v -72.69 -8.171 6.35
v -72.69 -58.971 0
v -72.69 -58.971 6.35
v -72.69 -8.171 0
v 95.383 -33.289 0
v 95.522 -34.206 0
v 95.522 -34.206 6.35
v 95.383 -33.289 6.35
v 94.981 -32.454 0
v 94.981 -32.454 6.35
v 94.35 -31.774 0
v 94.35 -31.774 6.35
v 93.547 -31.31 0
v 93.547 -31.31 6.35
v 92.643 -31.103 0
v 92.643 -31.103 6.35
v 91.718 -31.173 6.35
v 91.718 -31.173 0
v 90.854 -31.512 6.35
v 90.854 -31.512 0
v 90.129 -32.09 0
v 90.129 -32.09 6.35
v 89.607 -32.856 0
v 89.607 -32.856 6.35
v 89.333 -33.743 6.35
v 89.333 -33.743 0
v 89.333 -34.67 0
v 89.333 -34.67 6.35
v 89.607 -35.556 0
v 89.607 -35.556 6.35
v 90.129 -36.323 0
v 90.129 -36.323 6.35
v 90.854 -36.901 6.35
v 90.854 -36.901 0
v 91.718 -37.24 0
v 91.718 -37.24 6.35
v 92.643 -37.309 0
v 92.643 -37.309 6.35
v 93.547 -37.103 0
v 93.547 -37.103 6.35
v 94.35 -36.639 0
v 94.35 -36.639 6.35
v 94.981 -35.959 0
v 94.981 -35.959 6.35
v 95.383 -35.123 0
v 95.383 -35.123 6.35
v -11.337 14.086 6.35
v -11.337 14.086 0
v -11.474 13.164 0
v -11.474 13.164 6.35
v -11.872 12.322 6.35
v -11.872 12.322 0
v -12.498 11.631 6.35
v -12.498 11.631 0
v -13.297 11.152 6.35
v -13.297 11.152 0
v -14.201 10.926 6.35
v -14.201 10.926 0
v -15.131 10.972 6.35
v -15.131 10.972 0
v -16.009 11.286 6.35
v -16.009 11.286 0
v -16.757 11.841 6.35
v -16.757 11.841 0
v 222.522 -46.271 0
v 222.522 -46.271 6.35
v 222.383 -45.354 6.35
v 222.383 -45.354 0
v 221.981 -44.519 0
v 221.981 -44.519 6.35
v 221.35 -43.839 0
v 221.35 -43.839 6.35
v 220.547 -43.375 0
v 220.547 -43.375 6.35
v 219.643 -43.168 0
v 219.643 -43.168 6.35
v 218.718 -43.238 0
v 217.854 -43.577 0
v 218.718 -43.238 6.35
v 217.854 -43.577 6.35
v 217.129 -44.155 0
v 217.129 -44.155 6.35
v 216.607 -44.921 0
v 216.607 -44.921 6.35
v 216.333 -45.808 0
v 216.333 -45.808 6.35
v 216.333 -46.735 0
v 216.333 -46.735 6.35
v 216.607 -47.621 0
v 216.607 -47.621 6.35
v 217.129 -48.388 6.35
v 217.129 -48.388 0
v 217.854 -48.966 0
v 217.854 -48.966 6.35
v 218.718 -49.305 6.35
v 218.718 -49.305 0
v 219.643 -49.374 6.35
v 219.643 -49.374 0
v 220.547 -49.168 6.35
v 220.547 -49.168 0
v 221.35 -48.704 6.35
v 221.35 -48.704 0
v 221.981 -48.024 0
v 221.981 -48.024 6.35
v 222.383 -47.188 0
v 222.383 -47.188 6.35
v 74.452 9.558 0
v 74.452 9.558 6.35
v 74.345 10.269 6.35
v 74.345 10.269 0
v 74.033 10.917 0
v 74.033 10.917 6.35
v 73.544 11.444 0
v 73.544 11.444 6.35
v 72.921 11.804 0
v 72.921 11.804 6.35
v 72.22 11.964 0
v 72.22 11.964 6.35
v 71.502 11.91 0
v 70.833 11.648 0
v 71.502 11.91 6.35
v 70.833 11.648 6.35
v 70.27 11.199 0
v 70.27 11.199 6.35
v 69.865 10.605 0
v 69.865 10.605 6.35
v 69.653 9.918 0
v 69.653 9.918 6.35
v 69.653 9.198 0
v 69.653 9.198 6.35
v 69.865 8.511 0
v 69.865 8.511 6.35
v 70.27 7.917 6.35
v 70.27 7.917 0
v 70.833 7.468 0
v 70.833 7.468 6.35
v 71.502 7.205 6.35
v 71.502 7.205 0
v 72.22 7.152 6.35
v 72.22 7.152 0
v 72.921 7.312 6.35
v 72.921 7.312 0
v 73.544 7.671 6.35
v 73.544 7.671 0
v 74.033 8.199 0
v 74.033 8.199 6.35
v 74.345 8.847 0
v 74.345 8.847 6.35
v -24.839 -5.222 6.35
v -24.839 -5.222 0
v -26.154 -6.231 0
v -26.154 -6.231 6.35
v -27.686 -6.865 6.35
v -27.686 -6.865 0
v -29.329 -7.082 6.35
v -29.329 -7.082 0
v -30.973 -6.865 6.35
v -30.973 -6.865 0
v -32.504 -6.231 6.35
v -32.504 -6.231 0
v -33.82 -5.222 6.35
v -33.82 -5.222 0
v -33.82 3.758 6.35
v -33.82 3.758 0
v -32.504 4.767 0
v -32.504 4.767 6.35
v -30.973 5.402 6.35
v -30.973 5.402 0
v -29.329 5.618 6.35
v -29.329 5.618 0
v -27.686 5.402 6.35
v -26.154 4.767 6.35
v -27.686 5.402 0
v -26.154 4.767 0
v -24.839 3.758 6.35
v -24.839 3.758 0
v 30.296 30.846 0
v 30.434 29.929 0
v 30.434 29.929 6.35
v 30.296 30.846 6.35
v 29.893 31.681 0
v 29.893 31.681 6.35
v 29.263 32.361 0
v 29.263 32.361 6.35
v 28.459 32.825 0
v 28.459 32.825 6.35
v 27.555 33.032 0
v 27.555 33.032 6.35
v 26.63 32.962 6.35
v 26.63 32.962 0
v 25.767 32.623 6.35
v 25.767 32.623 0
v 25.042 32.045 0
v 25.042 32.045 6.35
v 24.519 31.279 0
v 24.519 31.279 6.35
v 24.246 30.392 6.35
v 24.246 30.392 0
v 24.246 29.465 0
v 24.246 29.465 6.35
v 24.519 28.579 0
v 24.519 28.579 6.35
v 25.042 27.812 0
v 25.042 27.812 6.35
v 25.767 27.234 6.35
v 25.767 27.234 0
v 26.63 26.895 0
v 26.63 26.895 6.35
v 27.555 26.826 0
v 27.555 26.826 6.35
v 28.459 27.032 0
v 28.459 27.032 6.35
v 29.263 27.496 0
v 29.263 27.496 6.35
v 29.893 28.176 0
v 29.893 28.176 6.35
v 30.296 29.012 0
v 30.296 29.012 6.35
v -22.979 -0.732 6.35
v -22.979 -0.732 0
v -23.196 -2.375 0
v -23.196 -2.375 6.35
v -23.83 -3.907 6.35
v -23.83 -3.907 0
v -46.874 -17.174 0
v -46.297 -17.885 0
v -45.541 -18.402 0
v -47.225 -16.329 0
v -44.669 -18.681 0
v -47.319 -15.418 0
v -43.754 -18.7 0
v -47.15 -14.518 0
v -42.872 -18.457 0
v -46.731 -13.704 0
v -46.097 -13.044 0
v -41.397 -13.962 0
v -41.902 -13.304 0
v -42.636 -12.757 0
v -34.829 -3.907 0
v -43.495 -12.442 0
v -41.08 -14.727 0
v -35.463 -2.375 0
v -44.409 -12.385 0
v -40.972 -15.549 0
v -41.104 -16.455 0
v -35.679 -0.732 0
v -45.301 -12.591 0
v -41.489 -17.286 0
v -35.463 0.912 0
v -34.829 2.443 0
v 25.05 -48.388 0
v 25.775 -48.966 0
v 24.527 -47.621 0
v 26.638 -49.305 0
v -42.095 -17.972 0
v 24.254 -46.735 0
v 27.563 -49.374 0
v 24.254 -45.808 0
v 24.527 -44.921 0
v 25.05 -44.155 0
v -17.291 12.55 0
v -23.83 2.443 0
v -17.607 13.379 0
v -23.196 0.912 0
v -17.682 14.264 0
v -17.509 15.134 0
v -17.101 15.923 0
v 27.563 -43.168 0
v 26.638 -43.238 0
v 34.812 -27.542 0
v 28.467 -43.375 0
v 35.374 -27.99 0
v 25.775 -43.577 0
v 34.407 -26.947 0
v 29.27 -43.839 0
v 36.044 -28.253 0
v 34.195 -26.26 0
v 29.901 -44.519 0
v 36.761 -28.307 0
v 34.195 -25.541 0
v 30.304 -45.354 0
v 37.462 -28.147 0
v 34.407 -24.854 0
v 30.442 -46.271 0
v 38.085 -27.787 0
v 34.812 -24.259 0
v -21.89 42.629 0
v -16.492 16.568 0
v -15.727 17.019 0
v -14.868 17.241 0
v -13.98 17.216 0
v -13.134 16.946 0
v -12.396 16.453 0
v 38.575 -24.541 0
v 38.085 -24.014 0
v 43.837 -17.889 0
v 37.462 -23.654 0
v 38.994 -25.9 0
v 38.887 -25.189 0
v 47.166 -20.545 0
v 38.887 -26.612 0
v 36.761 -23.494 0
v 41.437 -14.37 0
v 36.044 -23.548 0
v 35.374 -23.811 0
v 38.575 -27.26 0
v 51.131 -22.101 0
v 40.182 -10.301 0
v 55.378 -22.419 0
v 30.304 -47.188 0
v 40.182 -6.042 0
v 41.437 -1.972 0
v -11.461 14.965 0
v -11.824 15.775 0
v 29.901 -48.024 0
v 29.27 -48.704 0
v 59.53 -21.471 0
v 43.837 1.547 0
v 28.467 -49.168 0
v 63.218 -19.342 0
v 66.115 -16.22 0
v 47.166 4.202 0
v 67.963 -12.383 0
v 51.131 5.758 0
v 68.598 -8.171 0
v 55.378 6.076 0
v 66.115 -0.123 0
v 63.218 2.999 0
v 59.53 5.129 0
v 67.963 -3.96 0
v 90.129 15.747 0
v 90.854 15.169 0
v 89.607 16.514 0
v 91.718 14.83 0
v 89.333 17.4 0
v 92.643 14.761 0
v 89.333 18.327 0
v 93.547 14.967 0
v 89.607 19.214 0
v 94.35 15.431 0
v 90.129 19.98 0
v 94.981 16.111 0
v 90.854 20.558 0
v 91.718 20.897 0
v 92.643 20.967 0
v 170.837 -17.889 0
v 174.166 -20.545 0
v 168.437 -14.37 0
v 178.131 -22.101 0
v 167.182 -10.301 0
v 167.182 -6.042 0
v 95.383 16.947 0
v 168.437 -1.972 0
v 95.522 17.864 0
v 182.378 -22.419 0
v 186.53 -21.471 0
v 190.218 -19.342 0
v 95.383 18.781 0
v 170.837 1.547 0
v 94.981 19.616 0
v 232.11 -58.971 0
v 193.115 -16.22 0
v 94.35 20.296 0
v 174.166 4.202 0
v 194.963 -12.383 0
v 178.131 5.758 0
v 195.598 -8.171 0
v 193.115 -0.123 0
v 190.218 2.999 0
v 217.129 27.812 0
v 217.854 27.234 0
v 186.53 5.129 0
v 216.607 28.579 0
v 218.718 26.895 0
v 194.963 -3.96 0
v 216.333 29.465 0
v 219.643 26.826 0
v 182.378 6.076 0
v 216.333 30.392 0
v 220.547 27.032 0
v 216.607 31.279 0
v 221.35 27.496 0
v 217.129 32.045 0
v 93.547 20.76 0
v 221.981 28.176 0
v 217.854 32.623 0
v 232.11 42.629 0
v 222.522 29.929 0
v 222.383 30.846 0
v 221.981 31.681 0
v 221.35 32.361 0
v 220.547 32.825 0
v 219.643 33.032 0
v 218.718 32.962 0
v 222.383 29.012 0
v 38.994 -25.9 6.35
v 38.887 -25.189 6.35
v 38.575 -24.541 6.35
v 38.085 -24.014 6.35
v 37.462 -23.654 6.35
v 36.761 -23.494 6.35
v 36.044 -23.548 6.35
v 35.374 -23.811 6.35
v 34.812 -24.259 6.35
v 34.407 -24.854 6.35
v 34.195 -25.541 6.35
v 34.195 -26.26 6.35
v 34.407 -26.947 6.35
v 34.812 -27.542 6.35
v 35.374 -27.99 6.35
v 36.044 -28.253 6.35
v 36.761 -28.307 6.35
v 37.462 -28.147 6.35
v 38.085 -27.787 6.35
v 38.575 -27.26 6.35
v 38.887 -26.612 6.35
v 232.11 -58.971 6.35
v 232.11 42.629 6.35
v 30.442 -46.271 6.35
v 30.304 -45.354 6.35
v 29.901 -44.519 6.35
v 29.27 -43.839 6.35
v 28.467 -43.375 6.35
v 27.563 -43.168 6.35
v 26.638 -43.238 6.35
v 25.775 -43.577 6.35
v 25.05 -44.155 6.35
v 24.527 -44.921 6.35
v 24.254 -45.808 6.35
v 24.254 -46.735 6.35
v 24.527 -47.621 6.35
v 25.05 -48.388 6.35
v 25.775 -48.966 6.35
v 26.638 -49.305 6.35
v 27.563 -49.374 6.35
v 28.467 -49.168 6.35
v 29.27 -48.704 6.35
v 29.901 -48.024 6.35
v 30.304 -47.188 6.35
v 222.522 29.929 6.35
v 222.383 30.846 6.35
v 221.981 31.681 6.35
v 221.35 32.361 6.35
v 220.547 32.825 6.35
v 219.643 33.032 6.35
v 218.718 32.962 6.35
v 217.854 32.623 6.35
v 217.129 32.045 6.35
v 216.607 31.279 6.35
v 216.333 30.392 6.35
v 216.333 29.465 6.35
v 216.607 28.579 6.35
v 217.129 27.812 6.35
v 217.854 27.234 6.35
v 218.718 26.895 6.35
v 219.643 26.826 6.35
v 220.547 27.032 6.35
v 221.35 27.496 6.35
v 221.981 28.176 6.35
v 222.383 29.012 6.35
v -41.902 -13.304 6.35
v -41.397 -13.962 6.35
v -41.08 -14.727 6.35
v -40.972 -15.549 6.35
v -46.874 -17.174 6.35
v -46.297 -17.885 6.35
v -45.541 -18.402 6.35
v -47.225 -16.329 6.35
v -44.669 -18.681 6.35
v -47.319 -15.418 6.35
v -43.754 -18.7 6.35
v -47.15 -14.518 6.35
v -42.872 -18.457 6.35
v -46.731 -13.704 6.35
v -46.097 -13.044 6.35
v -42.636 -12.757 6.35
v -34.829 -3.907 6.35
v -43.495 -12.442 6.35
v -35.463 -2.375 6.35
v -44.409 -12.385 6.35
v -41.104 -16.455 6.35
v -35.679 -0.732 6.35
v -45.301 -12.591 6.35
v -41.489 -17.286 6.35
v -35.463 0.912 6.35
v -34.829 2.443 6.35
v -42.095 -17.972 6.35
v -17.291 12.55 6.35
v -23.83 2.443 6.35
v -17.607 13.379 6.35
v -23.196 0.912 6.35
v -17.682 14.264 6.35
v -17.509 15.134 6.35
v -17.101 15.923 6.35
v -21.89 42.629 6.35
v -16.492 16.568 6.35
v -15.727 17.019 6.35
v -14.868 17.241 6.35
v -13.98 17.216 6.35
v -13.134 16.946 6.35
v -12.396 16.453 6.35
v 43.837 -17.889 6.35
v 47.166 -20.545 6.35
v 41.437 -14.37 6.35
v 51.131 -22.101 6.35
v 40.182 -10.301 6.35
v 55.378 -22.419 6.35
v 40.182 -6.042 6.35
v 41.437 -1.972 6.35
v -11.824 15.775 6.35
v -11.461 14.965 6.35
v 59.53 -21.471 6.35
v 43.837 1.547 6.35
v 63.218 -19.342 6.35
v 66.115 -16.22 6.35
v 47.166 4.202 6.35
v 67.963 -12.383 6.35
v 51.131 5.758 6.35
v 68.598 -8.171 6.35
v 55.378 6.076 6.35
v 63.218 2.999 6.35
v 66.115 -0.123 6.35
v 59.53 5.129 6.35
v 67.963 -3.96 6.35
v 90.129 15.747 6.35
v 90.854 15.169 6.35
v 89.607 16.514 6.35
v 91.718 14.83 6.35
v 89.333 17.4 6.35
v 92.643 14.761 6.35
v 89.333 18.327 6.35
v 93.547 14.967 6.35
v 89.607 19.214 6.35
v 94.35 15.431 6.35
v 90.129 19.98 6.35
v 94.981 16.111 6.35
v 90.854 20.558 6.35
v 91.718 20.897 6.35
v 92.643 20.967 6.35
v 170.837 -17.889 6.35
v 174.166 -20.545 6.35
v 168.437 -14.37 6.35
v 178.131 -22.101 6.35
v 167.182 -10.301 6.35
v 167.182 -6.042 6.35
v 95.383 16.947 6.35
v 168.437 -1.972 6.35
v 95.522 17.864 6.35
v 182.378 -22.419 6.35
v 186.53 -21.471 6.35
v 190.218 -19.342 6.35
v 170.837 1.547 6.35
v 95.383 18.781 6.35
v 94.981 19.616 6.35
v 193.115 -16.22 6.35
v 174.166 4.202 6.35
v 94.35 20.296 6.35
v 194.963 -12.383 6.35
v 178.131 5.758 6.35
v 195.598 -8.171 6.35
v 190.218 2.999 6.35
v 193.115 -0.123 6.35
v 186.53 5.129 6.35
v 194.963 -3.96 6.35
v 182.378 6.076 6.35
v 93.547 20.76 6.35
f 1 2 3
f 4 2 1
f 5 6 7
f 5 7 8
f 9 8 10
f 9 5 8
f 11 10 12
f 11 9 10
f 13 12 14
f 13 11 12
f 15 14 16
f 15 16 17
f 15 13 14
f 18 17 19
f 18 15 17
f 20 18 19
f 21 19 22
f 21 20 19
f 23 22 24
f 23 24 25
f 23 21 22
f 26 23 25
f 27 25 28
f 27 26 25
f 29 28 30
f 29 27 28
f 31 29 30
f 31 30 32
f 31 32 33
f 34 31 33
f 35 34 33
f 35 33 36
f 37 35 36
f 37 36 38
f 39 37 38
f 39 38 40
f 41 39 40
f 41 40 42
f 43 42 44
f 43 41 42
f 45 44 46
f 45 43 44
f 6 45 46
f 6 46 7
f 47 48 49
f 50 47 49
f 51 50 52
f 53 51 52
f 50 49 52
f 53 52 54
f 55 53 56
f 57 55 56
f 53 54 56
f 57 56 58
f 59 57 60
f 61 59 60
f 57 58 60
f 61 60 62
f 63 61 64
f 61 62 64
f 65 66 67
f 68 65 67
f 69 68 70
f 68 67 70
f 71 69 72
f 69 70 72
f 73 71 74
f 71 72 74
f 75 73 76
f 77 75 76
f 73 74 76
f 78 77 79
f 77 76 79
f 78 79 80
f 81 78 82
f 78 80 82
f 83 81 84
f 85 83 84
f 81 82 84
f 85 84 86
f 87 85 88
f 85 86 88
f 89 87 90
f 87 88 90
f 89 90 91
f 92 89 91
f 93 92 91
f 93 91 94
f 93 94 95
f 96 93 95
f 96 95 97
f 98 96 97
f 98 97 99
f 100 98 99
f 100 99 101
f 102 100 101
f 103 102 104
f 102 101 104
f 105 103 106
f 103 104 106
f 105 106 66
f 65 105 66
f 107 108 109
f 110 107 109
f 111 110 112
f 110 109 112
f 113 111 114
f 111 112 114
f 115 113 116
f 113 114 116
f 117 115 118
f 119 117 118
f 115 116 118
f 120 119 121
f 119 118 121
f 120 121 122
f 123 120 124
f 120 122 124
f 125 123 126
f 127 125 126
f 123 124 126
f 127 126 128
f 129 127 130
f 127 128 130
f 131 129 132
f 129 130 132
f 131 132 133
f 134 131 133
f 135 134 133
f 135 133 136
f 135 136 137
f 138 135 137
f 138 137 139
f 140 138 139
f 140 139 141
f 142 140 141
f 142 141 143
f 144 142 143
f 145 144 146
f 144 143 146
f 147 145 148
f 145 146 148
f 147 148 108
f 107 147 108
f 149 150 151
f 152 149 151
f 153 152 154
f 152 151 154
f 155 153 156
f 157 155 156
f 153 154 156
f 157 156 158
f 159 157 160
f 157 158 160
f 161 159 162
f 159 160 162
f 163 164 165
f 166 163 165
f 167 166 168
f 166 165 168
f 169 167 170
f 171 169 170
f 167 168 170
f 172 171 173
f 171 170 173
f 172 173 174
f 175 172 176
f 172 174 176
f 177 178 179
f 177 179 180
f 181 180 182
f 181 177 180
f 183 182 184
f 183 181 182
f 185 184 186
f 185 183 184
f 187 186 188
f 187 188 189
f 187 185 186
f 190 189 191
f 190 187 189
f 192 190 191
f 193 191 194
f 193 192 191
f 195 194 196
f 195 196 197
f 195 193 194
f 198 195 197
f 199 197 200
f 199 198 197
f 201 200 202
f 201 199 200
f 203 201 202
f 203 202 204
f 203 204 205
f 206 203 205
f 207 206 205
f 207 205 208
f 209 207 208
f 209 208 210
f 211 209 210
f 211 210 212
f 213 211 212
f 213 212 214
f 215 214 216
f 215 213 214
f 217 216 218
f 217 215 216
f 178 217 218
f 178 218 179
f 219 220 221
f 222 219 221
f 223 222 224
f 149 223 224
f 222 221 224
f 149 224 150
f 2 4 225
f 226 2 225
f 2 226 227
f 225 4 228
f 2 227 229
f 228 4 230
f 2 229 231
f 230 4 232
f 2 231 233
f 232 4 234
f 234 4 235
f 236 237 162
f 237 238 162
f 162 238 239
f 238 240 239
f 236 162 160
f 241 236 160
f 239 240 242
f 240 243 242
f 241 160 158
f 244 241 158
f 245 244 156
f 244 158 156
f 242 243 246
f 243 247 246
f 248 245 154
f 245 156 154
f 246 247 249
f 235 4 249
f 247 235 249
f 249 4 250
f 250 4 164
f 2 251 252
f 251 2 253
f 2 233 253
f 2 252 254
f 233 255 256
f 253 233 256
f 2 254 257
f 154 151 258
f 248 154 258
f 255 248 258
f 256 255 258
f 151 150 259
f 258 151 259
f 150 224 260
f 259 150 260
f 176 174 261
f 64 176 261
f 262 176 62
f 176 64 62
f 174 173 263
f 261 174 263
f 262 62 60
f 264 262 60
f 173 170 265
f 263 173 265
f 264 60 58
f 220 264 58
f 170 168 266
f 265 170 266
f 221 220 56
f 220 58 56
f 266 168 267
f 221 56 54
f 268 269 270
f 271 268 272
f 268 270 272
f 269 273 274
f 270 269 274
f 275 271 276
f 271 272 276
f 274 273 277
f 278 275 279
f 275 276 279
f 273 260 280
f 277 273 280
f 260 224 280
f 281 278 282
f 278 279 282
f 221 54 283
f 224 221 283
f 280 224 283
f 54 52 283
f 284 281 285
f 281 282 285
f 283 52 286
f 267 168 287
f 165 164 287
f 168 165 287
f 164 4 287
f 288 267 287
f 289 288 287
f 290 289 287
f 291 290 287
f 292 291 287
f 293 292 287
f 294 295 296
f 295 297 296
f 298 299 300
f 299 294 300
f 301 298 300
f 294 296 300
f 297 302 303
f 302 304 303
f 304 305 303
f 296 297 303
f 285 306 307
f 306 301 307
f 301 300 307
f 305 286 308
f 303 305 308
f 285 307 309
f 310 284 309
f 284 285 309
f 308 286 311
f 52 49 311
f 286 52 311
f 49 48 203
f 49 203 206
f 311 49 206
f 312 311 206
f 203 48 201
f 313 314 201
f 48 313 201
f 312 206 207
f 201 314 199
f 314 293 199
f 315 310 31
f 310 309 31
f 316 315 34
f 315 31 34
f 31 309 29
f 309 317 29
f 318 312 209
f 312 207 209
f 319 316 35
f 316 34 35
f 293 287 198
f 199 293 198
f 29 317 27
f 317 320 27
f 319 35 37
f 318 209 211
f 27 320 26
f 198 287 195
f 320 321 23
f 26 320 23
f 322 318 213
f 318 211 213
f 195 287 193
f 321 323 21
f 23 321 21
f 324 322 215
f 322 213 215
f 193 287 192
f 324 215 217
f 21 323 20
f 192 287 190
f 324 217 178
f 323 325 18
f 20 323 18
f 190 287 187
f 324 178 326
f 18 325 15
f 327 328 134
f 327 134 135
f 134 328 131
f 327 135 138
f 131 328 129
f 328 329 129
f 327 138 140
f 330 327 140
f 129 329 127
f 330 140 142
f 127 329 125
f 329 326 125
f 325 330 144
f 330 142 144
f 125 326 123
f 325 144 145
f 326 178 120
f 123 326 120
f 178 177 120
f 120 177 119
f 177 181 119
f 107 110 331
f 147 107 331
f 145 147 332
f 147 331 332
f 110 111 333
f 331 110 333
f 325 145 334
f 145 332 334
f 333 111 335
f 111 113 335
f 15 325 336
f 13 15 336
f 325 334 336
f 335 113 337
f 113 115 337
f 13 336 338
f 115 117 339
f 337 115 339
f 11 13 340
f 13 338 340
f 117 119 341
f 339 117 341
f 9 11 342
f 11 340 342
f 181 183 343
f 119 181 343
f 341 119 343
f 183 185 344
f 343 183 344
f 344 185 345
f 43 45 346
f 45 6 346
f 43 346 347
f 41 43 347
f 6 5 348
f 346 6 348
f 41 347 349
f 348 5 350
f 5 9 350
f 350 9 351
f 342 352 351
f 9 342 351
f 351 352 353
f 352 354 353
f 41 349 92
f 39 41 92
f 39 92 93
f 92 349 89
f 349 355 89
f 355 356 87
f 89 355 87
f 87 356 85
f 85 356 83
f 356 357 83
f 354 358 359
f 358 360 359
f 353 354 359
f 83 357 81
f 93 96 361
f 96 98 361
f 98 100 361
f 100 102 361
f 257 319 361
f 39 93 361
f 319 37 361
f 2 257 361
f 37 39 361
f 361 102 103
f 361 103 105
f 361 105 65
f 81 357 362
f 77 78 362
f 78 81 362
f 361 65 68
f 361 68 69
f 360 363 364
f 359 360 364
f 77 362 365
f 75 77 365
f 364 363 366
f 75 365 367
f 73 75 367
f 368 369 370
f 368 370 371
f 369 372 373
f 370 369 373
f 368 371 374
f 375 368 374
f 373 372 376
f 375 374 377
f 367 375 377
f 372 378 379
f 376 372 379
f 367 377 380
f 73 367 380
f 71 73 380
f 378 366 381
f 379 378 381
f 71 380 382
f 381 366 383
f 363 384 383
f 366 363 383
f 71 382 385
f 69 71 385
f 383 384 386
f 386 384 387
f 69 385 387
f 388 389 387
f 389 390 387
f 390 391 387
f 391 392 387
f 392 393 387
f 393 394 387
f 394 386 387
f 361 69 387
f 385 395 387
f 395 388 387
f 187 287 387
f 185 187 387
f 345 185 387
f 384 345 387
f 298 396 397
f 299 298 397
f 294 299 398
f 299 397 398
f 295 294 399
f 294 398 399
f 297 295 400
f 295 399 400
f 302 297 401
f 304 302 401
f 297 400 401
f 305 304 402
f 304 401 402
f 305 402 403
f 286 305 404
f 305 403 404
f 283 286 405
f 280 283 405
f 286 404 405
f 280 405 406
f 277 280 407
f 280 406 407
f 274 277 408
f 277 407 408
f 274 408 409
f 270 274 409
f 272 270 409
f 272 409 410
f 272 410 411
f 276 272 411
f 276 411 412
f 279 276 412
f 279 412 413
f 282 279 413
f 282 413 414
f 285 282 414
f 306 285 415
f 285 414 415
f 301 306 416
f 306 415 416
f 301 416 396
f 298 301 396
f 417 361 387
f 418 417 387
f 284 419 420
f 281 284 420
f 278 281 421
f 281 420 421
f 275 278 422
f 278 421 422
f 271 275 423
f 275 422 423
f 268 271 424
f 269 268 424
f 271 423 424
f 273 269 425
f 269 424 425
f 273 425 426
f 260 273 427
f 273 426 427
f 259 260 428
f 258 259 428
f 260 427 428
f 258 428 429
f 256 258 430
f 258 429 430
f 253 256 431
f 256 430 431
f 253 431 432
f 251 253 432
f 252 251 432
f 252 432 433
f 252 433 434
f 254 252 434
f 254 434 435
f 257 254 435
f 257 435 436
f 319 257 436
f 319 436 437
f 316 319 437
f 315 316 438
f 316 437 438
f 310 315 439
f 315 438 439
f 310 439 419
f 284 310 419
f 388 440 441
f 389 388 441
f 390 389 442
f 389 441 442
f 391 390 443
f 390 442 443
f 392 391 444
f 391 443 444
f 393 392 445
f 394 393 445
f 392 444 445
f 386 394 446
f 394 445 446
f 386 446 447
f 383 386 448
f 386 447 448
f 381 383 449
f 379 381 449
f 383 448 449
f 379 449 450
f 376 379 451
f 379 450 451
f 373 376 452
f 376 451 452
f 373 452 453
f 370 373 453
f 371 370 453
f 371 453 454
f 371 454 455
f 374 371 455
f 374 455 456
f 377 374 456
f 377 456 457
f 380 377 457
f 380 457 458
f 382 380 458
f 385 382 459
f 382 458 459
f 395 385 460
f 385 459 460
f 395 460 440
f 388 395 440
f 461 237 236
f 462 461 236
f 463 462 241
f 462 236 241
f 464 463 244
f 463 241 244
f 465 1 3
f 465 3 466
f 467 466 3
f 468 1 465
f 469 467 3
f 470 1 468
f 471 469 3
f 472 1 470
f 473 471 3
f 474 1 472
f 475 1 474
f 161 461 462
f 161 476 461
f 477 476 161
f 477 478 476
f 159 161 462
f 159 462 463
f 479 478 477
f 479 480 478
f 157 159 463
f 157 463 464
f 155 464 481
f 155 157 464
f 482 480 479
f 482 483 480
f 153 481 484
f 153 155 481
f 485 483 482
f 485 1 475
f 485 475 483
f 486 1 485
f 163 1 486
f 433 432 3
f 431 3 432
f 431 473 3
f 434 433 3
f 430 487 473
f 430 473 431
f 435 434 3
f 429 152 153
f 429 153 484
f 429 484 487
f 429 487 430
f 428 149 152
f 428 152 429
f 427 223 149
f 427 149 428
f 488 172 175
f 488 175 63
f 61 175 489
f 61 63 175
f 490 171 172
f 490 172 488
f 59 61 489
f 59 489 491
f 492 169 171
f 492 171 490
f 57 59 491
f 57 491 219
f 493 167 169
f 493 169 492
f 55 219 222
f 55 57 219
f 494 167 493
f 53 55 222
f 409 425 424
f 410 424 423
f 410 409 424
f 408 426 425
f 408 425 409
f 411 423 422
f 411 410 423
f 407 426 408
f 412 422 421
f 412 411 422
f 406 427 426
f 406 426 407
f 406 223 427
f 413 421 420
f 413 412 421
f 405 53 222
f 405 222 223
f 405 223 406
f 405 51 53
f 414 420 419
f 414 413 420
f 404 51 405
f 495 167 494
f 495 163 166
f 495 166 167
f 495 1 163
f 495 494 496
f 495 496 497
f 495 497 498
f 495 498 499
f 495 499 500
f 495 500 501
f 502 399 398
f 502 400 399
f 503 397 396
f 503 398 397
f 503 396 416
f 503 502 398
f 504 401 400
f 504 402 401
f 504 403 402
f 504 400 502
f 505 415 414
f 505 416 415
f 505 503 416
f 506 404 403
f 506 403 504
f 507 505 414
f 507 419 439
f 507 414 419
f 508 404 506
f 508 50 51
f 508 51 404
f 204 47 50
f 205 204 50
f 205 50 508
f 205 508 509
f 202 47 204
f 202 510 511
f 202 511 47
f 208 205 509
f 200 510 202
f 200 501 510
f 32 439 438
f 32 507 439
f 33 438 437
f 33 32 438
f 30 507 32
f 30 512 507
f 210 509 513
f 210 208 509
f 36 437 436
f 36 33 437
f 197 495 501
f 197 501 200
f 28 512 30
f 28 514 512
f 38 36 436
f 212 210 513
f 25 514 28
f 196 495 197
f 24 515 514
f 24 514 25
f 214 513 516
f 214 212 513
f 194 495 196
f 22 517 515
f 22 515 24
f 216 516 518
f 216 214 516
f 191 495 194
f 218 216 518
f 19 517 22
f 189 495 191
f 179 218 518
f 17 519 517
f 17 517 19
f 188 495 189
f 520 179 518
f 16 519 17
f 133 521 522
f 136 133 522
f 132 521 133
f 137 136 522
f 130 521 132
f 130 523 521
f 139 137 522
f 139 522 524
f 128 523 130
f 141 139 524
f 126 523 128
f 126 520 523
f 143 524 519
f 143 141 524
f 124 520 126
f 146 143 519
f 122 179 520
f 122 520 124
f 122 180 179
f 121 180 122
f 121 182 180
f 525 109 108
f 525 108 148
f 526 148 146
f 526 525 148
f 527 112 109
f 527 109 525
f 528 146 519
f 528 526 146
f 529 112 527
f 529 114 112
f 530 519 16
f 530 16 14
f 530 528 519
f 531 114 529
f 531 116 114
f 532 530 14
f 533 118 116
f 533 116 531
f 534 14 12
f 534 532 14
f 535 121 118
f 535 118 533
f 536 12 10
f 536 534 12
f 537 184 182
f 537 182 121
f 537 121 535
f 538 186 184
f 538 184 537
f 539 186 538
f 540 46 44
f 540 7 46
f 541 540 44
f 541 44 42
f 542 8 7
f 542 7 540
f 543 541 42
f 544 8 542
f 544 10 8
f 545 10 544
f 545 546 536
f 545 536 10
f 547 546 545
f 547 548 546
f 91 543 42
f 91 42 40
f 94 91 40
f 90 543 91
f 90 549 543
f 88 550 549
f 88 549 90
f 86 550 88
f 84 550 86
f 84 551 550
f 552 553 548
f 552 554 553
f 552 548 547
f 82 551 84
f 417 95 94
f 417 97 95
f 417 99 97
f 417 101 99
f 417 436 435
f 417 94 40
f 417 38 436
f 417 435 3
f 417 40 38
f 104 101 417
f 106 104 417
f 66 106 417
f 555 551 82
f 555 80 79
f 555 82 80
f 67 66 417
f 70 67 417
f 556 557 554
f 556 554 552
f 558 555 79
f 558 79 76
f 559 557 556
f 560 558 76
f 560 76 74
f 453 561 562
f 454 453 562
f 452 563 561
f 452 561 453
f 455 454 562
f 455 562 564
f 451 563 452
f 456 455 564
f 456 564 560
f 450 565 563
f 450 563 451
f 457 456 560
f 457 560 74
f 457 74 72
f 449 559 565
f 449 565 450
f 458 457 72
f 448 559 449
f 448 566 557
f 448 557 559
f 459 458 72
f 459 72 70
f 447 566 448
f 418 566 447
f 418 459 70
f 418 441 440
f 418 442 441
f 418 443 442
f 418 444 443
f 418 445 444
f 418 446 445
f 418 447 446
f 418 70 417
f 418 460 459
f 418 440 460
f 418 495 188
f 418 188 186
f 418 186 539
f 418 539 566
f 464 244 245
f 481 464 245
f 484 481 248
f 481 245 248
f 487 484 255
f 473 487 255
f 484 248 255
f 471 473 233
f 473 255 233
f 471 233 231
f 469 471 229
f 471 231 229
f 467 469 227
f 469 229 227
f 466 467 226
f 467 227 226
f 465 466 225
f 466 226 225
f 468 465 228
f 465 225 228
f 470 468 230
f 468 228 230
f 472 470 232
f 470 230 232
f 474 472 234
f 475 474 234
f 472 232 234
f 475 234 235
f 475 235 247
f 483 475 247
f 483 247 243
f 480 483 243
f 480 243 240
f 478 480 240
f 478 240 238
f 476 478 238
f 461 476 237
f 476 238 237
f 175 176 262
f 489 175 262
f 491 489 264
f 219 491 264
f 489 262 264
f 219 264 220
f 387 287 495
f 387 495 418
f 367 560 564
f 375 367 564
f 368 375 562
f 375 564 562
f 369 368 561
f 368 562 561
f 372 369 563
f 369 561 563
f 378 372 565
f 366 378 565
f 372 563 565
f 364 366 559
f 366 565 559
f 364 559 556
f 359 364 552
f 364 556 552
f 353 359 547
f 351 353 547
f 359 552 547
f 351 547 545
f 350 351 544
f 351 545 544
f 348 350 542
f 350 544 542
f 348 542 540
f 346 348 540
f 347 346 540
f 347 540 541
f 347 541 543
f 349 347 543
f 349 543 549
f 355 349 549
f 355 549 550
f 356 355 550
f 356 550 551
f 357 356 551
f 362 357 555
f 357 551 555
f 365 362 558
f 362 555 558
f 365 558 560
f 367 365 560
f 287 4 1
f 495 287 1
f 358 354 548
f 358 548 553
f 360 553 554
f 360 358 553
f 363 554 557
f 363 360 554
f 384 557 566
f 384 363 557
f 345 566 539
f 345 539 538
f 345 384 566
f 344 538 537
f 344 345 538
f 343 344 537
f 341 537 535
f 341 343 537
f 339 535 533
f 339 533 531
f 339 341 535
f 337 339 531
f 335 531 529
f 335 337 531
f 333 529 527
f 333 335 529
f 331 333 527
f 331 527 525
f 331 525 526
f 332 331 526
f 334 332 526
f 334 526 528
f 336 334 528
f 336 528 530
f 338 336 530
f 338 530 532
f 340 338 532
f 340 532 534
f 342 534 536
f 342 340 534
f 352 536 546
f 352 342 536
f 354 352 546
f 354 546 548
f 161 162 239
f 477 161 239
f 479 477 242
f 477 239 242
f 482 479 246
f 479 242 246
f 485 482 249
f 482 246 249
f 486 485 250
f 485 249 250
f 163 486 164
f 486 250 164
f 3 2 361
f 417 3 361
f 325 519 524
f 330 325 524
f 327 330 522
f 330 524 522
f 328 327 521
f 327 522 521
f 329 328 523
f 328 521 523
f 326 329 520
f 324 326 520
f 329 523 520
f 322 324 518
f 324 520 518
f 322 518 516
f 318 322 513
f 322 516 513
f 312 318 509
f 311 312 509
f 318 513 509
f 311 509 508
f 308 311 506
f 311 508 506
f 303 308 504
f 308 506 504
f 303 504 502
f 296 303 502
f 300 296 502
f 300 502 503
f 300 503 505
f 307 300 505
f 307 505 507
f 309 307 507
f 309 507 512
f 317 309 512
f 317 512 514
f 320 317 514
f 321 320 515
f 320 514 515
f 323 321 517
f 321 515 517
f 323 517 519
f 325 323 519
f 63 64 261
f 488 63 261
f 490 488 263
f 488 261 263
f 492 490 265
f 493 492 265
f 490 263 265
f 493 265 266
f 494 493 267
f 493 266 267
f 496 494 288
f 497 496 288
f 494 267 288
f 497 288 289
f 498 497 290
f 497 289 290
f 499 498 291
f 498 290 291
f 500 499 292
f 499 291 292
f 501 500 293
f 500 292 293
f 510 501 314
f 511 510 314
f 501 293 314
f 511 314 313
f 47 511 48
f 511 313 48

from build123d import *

# Parameters (mm, degrees)
F0_W      = 304.8
F0_H      = 101.6
F1_DEPTH  = 6.35
F2_R      = 14.2875
F3_DEPTH  = 6.35
F5_R      = 2.413
F6_DEPTH  = 6.35
F7_R      = 3.1115
F8_DEPTH  = 6.35
F9_R      = 3.1115
F10_DEPTH = 6.35
F11_R     = 3.1115
F12_DEPTH = 6.35
F13_R     = 3.1115
F14_DEPTH = 6.35
F15_R     = 14.2875
F16_DEPTH = 6.35
F17_R     = 3.1115
F19_DEPTH = 6.35
F18_R     = 3.1115
F20_DEPTH = 6.35
F21_SIZE  = 50.8
F23_DEPTH = 6.35


with BuildPart() as f1:
    # F0 (on Top) → F1 (new body)
    with BuildSketch(Plane.XY):
        with Locations((79.710026, -8.171286)):
            Rectangle(F0_W, F0_H)
    extrude(amount=F1_DEPTH)

    # F2 (on face) → F3 (cut)
    with BuildSketch(Plane.XY.offset(6.35)):
        with Locations((54.310026, -8.171286)):
            Circle(F2_R)
    extrude(amount=-F3_DEPTH, mode=Mode.SUBTRACT)

    # F5 (on face) → F6 (cut)
    with BuildSketch(Plane.XY.offset(6.35)):
        with Locations((36.580826, -25.900486)):
            Circle(F5_R)
        with Locations((72.039226, 9.557914)):
            Circle(F5_R)
    extrude(amount=-F6_DEPTH, mode=Mode.SUBTRACT)

    # F7 (on face) → F8 (cut)
    with BuildSketch(Plane.XY):
        with Locations((27.322526, 29.928714)):
            Circle(F7_R)
    extrude(amount=F8_DEPTH, mode=Mode.SUBTRACT)

    # F9 (on face) → F10 (cut)
    with BuildSketch(Plane.XY.offset(6.35)):
        with Locations((219.410026, 29.928714)):
            Circle(F9_R)
    extrude(amount=-F10_DEPTH, mode=Mode.SUBTRACT)

    # F11 (on face) → F12 (cut)
    with BuildSketch(Plane.XY.offset(6.35)):
        with Locations((27.330443, -46.271286)):
            Circle(F11_R)
    extrude(amount=-F12_DEPTH, mode=Mode.SUBTRACT)

    # F13 (on face) → F14 (cut)
    with BuildSketch(Plane.XY.offset(6.35)):
        with Locations((219.410026, -46.271286)):
            Circle(F13_R)
    extrude(amount=-F14_DEPTH, mode=Mode.SUBTRACT)

    # F15 (on face) → F16 (cut)
    with BuildSketch(Plane.XY.offset(6.35)):
        with Locations((181.310026, -8.171286)):
            Circle(F15_R)
    extrude(amount=-F16_DEPTH, mode=Mode.SUBTRACT)

    # F17 (on Top) → F19 (cut)
    with BuildSketch(Plane.XY):
        with Locations((92.410026, 17.863714)):
            Circle(F17_R)
    extrude(amount=F19_DEPTH, mode=Mode.SUBTRACT)

    # F18 (on Top) → F20 (cut)
    with BuildSketch(Plane.XY):
        with Locations((92.410026, -34.206286)):
            Circle(F18_R)
    extrude(amount=F20_DEPTH, mode=Mode.SUBTRACT)

    # F21
    f21_edges = [f1.edges().sort_by_distance(p)[0] for p in [
        (-72.689974, 42.628714, 3.175),
    ]]
    chamfer(f21_edges, length=F21_SIZE)

    # F22 (on face) → F23 (cut)
    with BuildSketch(Plane(origin=(0, 0, 0), x_dir=(1, 0, 0), z_dir=(0, 0, -1))):
        with BuildLine():
            ThreePointArc((-40.971884, 15.549221), (-47.080201, 16.76424), (-41.90182, 13.304157))
            ThreePointArc((-41.90182, 13.304157), (-41.213566, 14.334201), (-40.971884, 15.549221))
        make_face()
        with BuildLine():
            ThreePointArc((-33.819589, 5.221926), (-35.679461, 0.731798), (-33.819589, -3.75833))
            Line((-33.819589, -3.75833), (-29.329461, 0.731798))
            Line((-29.329461, 0.731798), (-33.819589, 5.221926))
        make_face()
        with BuildLine():
            Line((-33.819589, 5.221926), (-29.329461, 0.731798))
            Line((-29.329461, 0.731798), (-24.839333, 5.221926))
            ThreePointArc((-24.839333, 5.221926), (-29.329461, 7.081798), (-33.819589, 5.221926))
        make_face()
        with BuildLine():
            Line((-24.839333, 5.221926), (-29.329461, 0.731798))
            Line((-29.329461, 0.731798), (-24.839333, -3.75833))
            ThreePointArc((-24.839333, -3.75833), (-23.462826, -1.698242), (-22.979461, 0.731798))
            ThreePointArc((-22.979461, 0.731798), (-23.462826, 3.161838), (-24.839333, 5.221926))
        make_face()
        with BuildLine():
            Line((-29.329461, 0.731798), (-33.819589, -3.75833))
            ThreePointArc((-33.819589, -3.75833), (-29.329461, -5.618202), (-24.839333, -3.75833))
            Line((-24.839333, -3.75833), (-29.329461, 0.731798))
        make_face()
        with BuildLine():
            ThreePointArc((-11.337039, -14.085625), (-13.297019, -11.152307), (-16.757103, -11.840561))
            ThreePointArc((-16.757103, -11.840561), (-15.727059, -17.018942), (-11.337039, -14.085625))
        make_face()
    extrude(amount=-F23_DEPTH, mode=Mode.SUBTRACT)


solid = f1.part
